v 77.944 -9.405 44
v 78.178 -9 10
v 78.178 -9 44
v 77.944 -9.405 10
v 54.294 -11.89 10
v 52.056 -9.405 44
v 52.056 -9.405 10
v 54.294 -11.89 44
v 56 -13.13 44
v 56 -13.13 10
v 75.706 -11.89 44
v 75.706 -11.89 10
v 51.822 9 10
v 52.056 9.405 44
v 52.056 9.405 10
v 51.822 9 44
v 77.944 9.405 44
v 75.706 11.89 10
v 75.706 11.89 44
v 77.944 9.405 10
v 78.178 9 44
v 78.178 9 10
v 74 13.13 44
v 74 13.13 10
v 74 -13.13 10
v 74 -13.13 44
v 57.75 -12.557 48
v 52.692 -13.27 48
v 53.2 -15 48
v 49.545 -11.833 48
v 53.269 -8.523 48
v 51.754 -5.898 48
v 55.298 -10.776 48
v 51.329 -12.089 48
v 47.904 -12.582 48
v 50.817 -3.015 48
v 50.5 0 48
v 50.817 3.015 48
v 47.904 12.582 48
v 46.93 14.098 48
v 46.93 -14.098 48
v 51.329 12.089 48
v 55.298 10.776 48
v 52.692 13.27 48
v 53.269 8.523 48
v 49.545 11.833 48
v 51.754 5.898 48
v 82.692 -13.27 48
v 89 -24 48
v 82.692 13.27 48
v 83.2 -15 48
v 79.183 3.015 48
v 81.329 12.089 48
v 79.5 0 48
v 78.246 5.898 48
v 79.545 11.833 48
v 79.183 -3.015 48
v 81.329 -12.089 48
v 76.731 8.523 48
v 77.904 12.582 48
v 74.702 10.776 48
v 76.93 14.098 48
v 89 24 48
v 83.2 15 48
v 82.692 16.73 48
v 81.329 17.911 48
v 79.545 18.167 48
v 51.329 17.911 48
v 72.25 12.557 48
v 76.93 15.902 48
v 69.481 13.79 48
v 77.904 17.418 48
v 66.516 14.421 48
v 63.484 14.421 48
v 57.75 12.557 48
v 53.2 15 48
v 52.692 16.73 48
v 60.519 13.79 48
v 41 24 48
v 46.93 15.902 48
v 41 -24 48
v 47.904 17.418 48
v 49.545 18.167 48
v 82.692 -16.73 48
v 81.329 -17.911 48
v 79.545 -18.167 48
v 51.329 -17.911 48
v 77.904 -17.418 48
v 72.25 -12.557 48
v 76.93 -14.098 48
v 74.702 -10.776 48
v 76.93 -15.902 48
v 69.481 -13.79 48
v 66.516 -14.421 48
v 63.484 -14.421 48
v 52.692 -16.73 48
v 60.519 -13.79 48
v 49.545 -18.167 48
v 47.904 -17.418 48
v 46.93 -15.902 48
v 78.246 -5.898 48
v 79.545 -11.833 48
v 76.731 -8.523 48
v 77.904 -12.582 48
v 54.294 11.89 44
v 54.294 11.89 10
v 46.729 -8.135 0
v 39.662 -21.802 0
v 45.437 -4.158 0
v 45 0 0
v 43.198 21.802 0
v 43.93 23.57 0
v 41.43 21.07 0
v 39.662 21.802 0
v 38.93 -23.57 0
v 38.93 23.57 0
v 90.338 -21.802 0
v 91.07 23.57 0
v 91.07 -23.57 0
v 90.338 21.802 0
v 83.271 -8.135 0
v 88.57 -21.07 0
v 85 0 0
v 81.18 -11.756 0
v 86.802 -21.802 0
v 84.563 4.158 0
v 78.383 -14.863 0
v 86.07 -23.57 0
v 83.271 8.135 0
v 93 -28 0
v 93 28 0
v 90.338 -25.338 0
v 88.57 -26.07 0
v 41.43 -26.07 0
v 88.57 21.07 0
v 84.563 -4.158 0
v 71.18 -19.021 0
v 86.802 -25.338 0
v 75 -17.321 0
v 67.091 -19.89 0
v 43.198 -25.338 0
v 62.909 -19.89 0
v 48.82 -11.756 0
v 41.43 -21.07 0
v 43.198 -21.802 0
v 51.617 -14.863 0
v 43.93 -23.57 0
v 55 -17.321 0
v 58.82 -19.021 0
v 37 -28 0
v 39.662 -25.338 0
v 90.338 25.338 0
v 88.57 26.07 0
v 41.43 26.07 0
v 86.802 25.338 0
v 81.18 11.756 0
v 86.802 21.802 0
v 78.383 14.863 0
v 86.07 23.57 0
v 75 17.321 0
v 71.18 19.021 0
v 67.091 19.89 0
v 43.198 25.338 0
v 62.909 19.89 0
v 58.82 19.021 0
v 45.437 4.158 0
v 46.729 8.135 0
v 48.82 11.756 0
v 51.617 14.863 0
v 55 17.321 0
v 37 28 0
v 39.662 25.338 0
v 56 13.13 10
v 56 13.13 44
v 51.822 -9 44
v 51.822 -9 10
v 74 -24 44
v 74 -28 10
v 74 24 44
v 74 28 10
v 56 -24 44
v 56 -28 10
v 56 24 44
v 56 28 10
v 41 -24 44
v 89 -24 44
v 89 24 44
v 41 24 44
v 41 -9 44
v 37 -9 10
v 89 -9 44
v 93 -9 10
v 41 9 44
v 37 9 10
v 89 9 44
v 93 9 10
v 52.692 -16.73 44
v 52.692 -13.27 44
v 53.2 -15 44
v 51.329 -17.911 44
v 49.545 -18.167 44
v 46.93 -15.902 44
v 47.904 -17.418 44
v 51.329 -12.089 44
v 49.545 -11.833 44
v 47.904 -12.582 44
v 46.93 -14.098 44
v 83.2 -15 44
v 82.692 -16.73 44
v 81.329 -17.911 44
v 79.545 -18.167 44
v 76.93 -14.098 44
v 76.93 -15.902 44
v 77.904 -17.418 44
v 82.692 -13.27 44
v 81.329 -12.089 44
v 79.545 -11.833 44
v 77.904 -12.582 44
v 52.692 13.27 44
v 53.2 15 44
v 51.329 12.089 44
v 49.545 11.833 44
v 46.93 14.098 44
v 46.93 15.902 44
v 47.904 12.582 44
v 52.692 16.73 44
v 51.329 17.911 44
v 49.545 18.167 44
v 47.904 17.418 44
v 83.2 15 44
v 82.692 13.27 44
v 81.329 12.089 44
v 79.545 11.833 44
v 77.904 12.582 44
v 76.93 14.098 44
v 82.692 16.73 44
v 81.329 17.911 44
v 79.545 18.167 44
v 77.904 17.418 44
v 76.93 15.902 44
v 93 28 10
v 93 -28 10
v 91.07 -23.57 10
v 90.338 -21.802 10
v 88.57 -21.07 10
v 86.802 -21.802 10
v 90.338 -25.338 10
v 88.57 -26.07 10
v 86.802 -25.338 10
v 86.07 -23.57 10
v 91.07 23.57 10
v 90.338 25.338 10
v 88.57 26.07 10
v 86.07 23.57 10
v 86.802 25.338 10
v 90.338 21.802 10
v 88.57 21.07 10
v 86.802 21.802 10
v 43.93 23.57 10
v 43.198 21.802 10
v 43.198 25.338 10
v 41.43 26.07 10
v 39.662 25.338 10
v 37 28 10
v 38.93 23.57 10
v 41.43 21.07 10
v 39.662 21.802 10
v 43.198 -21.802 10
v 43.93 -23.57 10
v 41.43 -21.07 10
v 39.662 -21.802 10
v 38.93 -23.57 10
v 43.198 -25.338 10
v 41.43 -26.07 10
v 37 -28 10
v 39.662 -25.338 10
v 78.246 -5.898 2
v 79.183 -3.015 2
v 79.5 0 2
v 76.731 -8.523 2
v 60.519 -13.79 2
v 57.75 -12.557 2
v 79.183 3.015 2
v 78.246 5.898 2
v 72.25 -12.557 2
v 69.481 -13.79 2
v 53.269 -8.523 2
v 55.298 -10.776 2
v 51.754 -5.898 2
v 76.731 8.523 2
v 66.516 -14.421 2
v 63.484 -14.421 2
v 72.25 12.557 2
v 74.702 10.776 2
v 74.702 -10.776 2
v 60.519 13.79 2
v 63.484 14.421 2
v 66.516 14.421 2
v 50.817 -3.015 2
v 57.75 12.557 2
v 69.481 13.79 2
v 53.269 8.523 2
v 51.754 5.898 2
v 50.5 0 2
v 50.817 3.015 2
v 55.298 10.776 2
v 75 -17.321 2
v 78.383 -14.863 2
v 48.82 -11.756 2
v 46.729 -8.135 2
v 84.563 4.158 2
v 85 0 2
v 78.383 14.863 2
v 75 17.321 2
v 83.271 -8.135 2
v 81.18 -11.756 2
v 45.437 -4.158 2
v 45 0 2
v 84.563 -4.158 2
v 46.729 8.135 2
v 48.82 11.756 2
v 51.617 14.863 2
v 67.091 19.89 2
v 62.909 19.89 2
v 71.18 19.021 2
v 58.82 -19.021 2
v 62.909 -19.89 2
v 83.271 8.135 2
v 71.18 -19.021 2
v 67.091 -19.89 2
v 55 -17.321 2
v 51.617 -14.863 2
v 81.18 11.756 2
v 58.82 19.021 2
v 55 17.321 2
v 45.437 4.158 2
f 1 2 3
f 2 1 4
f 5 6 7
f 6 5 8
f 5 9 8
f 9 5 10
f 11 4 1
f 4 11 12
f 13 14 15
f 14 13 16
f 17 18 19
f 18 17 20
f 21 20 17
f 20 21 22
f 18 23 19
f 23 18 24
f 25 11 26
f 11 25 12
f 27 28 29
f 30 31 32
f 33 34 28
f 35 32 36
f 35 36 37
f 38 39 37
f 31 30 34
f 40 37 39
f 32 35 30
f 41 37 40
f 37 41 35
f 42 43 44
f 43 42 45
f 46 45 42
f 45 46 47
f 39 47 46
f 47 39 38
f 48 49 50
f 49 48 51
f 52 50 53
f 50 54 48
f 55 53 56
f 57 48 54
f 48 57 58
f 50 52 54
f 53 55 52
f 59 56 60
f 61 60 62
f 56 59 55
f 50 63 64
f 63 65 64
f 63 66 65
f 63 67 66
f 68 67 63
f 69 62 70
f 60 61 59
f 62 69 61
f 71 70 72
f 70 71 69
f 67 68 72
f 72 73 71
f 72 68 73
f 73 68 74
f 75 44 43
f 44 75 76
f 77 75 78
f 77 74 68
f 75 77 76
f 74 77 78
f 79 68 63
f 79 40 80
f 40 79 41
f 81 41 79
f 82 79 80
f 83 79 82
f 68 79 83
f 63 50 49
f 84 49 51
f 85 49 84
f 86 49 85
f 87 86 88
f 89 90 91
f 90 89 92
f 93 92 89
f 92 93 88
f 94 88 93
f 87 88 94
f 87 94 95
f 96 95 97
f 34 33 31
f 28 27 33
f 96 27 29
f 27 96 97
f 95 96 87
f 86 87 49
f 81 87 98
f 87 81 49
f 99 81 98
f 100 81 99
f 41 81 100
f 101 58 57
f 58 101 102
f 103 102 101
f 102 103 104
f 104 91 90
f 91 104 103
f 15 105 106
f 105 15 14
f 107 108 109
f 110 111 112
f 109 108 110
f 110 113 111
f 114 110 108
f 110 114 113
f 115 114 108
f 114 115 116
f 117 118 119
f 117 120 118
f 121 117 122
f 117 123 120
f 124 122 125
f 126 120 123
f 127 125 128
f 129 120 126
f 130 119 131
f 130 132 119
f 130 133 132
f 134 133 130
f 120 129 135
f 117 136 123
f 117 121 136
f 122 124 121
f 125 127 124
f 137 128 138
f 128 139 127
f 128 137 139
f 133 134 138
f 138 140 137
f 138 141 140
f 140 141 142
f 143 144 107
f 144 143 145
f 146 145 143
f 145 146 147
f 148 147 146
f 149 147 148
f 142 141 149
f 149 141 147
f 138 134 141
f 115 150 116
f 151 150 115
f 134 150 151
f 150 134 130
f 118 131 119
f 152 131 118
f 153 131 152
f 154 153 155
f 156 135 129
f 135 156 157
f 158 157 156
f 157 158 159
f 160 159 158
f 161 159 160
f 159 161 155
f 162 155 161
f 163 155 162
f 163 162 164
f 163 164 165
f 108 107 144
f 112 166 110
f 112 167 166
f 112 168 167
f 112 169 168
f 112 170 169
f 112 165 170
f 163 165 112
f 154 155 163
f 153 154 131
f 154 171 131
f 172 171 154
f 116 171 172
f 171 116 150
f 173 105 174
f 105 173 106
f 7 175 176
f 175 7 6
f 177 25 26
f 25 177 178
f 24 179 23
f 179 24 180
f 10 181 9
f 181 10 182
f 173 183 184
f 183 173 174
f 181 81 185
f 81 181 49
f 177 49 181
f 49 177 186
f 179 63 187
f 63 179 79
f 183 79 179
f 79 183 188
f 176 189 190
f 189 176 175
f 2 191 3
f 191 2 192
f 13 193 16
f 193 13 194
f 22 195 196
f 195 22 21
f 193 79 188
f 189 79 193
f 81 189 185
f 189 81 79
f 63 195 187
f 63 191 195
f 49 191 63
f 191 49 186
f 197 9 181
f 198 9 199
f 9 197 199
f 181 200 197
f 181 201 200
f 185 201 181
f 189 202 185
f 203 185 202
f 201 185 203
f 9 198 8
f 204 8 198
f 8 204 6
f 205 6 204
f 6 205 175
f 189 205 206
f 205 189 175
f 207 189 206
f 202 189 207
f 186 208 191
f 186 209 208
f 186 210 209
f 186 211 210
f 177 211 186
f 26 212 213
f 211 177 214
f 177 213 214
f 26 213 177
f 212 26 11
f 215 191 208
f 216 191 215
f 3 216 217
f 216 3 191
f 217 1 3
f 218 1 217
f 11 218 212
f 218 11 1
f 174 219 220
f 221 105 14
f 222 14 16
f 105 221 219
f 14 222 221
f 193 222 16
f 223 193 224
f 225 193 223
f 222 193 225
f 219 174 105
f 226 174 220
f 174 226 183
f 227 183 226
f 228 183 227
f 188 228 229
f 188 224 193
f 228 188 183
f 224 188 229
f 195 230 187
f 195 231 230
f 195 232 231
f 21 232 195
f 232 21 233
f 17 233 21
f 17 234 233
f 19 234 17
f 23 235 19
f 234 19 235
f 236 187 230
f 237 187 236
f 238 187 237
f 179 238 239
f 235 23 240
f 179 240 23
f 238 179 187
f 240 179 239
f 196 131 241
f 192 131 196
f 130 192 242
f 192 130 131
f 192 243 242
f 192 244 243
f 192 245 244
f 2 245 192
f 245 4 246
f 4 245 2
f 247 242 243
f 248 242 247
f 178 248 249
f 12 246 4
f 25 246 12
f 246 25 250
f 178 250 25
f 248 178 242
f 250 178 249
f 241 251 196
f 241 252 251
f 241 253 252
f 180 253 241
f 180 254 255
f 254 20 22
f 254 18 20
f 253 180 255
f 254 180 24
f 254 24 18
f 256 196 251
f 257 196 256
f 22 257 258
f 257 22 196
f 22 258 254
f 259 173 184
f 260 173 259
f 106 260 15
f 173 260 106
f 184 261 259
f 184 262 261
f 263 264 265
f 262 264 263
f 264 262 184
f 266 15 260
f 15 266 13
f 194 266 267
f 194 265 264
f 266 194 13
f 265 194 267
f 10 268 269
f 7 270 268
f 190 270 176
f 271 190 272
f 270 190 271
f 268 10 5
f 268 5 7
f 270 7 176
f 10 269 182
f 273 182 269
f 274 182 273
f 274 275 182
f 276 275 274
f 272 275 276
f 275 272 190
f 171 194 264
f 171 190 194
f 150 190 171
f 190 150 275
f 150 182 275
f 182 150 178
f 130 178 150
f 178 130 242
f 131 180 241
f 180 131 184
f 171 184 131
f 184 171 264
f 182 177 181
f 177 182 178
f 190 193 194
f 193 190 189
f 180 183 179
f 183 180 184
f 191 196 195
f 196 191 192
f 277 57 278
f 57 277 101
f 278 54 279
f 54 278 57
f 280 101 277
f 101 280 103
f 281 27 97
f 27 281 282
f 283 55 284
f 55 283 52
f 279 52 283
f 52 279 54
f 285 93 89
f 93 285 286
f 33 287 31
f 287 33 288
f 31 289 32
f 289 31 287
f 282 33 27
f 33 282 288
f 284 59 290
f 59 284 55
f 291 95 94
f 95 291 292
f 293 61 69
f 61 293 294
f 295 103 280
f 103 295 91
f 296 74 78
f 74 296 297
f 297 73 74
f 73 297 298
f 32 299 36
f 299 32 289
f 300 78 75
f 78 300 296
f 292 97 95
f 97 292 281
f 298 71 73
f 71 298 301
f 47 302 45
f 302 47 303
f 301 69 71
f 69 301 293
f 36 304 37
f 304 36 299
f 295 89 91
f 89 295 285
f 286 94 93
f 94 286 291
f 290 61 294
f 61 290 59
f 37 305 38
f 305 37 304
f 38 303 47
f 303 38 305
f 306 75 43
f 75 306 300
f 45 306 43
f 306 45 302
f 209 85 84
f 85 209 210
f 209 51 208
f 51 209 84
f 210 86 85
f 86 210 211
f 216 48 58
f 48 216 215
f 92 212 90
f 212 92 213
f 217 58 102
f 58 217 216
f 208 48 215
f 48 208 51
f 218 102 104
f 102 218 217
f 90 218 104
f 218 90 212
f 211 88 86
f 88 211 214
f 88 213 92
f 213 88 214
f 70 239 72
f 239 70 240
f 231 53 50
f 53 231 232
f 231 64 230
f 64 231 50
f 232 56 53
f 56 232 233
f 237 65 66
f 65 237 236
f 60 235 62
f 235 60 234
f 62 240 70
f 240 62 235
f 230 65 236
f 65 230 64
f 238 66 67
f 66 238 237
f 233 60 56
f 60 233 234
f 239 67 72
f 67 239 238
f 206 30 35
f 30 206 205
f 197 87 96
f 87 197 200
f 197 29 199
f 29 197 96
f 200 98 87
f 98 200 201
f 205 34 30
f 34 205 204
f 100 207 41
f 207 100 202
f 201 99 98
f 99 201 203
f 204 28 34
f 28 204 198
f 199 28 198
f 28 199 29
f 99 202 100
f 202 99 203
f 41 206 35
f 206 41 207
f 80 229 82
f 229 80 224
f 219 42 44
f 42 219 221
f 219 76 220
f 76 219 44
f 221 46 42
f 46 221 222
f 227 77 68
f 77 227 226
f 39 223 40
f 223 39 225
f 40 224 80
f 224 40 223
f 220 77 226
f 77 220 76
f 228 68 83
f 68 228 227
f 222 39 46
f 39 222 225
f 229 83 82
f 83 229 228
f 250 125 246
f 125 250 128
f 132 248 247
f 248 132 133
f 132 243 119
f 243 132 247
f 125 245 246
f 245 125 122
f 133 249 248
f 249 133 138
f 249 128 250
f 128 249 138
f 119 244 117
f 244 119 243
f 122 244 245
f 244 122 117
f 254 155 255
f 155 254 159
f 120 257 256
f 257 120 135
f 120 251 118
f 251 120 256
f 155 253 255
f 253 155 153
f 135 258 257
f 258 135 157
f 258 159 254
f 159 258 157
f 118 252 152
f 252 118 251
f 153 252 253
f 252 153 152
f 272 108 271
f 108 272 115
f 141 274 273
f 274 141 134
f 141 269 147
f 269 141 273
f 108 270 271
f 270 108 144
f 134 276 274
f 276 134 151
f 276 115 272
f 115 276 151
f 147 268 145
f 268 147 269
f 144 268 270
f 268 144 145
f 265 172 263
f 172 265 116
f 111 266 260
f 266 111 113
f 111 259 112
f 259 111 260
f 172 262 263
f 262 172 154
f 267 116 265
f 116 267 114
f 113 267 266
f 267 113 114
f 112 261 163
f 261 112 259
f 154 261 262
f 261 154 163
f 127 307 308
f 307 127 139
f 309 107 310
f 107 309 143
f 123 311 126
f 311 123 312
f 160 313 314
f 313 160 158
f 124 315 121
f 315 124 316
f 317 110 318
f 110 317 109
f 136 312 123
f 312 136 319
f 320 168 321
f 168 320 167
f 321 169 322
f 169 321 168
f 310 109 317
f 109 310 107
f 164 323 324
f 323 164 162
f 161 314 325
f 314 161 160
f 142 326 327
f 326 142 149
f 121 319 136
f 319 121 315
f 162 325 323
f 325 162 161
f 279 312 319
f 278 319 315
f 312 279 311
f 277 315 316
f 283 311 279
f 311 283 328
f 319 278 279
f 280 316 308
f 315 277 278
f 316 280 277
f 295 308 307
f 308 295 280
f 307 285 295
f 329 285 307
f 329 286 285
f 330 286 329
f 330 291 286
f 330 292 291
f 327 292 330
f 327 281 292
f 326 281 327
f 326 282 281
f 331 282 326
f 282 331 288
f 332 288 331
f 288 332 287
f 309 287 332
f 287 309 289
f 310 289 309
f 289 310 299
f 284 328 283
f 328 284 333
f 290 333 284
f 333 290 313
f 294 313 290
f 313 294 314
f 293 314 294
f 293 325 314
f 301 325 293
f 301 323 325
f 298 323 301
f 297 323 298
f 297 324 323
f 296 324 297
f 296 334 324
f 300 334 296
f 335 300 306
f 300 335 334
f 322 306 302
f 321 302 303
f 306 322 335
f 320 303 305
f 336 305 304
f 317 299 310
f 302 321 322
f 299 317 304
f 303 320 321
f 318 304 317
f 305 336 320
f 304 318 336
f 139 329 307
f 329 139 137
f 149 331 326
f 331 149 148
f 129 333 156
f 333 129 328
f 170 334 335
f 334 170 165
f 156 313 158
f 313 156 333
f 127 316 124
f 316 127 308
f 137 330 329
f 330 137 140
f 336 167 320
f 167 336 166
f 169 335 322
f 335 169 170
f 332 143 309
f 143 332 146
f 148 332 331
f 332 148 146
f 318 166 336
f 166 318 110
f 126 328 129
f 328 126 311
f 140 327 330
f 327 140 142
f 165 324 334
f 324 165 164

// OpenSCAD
module stuetze() {
	translate([9,0,0]) rotate(90, [0,-1,0]) linear_extrude(height=18) polygon([[11.5,24],[11,20],[11,20],[46,20],[46,28],[45.5,28]]);
}

module part1() {
	difference() {
		union() {
			translate([0,0,-12]) cylinder(r=13.1, h=19.5);
			
			translate([-24,-24,0]) cube([48,48,7.5]);
			
		}
		cylinder(r=11.2, h=13);
		translate([0,0,-13]) cylinder(r=10, h=14);
		translate([15,15,-13]) cylinder(r=3.2, h=26);
		translate([15,-15,-13]) cylinder(r=3.2, h=26);
		translate([-15,15,-13]) cylinder(r=3.2, h=26);
		translate([-15,-15,-13]) cylinder(r=3.2, h=26);


	}
}

module part2() {
	difference() {
		union() {
			translate([0,0,7.5]) cylinder(r=16, h=48);
			translate([-9,-24,7.5]) cube([18,48,48]);
			rotate(90,[0,0,1]) translate([-9,-24,7.5]) cube([18,48,48]);
			translate([-24,-24,7.5]) cube([48,48,4]);
			translate([-28,-28,45.5]) cube([56,56,10]);
			
			#stuetze();
			rotate(90,[0,0,1]) stuetze();
			rotate(180,[0,0,1]) stuetze();
			rotate(270,[0,0,1]) stuetze();

			//translate([-10,-24,11.5]) 	//rotate(7.6,[1,0,0]) cube([20,10,30.3]);
			//rotate(90,[0,0,1]) translate([-10,-24,7.5]) rotate(7.6,[1,0,0]) cube([20,10,30.3]);
			//rotate(180,[0,0,1]) translate([-10,-24,7.5]) rotate(7.6,[1,0,0]) cube([20,10,30.3]);
			///rotate(270,[0,0,1]) translate([-10,-24,7.5]) rotate(7.6,[1,0,0]) cube([20,10,30.3]);
		}
		translate([0,0,7]) cylinder(r=14.5, h=49);

		translate([15,15,7]) cylinder(r=3.2, h=5);
		translate([15,-15,7]) cylinder(r=3.2, h=5);
		translate([-15,15,7]) cylinder(r=3.2, h=5);
		translate([-15,-15,7]) cylinder(r=3.2, h=5);

		translate([23.57,23.57,45]) cylinder(r=2.5, h=11);
		translate([23.57,-23.57,45]) cylinder(r=2.5, h=11);
		translate([-23.57,23.57,45]) cylinder(r=2.5, h=11);
		translate([-23.57,-23.57,45]) cylinder(r=2.5, h=11);

		translate([0,0,53.5]) cylinder(r=20, h=9);
		
	}
}

//translate([0,0,7.5]) rotate(180,[1,0,0]) 	part1();
translate([0,0,48])  rotate(180,[1,0,0]) translate([65,0,-7.5])
	part2();
